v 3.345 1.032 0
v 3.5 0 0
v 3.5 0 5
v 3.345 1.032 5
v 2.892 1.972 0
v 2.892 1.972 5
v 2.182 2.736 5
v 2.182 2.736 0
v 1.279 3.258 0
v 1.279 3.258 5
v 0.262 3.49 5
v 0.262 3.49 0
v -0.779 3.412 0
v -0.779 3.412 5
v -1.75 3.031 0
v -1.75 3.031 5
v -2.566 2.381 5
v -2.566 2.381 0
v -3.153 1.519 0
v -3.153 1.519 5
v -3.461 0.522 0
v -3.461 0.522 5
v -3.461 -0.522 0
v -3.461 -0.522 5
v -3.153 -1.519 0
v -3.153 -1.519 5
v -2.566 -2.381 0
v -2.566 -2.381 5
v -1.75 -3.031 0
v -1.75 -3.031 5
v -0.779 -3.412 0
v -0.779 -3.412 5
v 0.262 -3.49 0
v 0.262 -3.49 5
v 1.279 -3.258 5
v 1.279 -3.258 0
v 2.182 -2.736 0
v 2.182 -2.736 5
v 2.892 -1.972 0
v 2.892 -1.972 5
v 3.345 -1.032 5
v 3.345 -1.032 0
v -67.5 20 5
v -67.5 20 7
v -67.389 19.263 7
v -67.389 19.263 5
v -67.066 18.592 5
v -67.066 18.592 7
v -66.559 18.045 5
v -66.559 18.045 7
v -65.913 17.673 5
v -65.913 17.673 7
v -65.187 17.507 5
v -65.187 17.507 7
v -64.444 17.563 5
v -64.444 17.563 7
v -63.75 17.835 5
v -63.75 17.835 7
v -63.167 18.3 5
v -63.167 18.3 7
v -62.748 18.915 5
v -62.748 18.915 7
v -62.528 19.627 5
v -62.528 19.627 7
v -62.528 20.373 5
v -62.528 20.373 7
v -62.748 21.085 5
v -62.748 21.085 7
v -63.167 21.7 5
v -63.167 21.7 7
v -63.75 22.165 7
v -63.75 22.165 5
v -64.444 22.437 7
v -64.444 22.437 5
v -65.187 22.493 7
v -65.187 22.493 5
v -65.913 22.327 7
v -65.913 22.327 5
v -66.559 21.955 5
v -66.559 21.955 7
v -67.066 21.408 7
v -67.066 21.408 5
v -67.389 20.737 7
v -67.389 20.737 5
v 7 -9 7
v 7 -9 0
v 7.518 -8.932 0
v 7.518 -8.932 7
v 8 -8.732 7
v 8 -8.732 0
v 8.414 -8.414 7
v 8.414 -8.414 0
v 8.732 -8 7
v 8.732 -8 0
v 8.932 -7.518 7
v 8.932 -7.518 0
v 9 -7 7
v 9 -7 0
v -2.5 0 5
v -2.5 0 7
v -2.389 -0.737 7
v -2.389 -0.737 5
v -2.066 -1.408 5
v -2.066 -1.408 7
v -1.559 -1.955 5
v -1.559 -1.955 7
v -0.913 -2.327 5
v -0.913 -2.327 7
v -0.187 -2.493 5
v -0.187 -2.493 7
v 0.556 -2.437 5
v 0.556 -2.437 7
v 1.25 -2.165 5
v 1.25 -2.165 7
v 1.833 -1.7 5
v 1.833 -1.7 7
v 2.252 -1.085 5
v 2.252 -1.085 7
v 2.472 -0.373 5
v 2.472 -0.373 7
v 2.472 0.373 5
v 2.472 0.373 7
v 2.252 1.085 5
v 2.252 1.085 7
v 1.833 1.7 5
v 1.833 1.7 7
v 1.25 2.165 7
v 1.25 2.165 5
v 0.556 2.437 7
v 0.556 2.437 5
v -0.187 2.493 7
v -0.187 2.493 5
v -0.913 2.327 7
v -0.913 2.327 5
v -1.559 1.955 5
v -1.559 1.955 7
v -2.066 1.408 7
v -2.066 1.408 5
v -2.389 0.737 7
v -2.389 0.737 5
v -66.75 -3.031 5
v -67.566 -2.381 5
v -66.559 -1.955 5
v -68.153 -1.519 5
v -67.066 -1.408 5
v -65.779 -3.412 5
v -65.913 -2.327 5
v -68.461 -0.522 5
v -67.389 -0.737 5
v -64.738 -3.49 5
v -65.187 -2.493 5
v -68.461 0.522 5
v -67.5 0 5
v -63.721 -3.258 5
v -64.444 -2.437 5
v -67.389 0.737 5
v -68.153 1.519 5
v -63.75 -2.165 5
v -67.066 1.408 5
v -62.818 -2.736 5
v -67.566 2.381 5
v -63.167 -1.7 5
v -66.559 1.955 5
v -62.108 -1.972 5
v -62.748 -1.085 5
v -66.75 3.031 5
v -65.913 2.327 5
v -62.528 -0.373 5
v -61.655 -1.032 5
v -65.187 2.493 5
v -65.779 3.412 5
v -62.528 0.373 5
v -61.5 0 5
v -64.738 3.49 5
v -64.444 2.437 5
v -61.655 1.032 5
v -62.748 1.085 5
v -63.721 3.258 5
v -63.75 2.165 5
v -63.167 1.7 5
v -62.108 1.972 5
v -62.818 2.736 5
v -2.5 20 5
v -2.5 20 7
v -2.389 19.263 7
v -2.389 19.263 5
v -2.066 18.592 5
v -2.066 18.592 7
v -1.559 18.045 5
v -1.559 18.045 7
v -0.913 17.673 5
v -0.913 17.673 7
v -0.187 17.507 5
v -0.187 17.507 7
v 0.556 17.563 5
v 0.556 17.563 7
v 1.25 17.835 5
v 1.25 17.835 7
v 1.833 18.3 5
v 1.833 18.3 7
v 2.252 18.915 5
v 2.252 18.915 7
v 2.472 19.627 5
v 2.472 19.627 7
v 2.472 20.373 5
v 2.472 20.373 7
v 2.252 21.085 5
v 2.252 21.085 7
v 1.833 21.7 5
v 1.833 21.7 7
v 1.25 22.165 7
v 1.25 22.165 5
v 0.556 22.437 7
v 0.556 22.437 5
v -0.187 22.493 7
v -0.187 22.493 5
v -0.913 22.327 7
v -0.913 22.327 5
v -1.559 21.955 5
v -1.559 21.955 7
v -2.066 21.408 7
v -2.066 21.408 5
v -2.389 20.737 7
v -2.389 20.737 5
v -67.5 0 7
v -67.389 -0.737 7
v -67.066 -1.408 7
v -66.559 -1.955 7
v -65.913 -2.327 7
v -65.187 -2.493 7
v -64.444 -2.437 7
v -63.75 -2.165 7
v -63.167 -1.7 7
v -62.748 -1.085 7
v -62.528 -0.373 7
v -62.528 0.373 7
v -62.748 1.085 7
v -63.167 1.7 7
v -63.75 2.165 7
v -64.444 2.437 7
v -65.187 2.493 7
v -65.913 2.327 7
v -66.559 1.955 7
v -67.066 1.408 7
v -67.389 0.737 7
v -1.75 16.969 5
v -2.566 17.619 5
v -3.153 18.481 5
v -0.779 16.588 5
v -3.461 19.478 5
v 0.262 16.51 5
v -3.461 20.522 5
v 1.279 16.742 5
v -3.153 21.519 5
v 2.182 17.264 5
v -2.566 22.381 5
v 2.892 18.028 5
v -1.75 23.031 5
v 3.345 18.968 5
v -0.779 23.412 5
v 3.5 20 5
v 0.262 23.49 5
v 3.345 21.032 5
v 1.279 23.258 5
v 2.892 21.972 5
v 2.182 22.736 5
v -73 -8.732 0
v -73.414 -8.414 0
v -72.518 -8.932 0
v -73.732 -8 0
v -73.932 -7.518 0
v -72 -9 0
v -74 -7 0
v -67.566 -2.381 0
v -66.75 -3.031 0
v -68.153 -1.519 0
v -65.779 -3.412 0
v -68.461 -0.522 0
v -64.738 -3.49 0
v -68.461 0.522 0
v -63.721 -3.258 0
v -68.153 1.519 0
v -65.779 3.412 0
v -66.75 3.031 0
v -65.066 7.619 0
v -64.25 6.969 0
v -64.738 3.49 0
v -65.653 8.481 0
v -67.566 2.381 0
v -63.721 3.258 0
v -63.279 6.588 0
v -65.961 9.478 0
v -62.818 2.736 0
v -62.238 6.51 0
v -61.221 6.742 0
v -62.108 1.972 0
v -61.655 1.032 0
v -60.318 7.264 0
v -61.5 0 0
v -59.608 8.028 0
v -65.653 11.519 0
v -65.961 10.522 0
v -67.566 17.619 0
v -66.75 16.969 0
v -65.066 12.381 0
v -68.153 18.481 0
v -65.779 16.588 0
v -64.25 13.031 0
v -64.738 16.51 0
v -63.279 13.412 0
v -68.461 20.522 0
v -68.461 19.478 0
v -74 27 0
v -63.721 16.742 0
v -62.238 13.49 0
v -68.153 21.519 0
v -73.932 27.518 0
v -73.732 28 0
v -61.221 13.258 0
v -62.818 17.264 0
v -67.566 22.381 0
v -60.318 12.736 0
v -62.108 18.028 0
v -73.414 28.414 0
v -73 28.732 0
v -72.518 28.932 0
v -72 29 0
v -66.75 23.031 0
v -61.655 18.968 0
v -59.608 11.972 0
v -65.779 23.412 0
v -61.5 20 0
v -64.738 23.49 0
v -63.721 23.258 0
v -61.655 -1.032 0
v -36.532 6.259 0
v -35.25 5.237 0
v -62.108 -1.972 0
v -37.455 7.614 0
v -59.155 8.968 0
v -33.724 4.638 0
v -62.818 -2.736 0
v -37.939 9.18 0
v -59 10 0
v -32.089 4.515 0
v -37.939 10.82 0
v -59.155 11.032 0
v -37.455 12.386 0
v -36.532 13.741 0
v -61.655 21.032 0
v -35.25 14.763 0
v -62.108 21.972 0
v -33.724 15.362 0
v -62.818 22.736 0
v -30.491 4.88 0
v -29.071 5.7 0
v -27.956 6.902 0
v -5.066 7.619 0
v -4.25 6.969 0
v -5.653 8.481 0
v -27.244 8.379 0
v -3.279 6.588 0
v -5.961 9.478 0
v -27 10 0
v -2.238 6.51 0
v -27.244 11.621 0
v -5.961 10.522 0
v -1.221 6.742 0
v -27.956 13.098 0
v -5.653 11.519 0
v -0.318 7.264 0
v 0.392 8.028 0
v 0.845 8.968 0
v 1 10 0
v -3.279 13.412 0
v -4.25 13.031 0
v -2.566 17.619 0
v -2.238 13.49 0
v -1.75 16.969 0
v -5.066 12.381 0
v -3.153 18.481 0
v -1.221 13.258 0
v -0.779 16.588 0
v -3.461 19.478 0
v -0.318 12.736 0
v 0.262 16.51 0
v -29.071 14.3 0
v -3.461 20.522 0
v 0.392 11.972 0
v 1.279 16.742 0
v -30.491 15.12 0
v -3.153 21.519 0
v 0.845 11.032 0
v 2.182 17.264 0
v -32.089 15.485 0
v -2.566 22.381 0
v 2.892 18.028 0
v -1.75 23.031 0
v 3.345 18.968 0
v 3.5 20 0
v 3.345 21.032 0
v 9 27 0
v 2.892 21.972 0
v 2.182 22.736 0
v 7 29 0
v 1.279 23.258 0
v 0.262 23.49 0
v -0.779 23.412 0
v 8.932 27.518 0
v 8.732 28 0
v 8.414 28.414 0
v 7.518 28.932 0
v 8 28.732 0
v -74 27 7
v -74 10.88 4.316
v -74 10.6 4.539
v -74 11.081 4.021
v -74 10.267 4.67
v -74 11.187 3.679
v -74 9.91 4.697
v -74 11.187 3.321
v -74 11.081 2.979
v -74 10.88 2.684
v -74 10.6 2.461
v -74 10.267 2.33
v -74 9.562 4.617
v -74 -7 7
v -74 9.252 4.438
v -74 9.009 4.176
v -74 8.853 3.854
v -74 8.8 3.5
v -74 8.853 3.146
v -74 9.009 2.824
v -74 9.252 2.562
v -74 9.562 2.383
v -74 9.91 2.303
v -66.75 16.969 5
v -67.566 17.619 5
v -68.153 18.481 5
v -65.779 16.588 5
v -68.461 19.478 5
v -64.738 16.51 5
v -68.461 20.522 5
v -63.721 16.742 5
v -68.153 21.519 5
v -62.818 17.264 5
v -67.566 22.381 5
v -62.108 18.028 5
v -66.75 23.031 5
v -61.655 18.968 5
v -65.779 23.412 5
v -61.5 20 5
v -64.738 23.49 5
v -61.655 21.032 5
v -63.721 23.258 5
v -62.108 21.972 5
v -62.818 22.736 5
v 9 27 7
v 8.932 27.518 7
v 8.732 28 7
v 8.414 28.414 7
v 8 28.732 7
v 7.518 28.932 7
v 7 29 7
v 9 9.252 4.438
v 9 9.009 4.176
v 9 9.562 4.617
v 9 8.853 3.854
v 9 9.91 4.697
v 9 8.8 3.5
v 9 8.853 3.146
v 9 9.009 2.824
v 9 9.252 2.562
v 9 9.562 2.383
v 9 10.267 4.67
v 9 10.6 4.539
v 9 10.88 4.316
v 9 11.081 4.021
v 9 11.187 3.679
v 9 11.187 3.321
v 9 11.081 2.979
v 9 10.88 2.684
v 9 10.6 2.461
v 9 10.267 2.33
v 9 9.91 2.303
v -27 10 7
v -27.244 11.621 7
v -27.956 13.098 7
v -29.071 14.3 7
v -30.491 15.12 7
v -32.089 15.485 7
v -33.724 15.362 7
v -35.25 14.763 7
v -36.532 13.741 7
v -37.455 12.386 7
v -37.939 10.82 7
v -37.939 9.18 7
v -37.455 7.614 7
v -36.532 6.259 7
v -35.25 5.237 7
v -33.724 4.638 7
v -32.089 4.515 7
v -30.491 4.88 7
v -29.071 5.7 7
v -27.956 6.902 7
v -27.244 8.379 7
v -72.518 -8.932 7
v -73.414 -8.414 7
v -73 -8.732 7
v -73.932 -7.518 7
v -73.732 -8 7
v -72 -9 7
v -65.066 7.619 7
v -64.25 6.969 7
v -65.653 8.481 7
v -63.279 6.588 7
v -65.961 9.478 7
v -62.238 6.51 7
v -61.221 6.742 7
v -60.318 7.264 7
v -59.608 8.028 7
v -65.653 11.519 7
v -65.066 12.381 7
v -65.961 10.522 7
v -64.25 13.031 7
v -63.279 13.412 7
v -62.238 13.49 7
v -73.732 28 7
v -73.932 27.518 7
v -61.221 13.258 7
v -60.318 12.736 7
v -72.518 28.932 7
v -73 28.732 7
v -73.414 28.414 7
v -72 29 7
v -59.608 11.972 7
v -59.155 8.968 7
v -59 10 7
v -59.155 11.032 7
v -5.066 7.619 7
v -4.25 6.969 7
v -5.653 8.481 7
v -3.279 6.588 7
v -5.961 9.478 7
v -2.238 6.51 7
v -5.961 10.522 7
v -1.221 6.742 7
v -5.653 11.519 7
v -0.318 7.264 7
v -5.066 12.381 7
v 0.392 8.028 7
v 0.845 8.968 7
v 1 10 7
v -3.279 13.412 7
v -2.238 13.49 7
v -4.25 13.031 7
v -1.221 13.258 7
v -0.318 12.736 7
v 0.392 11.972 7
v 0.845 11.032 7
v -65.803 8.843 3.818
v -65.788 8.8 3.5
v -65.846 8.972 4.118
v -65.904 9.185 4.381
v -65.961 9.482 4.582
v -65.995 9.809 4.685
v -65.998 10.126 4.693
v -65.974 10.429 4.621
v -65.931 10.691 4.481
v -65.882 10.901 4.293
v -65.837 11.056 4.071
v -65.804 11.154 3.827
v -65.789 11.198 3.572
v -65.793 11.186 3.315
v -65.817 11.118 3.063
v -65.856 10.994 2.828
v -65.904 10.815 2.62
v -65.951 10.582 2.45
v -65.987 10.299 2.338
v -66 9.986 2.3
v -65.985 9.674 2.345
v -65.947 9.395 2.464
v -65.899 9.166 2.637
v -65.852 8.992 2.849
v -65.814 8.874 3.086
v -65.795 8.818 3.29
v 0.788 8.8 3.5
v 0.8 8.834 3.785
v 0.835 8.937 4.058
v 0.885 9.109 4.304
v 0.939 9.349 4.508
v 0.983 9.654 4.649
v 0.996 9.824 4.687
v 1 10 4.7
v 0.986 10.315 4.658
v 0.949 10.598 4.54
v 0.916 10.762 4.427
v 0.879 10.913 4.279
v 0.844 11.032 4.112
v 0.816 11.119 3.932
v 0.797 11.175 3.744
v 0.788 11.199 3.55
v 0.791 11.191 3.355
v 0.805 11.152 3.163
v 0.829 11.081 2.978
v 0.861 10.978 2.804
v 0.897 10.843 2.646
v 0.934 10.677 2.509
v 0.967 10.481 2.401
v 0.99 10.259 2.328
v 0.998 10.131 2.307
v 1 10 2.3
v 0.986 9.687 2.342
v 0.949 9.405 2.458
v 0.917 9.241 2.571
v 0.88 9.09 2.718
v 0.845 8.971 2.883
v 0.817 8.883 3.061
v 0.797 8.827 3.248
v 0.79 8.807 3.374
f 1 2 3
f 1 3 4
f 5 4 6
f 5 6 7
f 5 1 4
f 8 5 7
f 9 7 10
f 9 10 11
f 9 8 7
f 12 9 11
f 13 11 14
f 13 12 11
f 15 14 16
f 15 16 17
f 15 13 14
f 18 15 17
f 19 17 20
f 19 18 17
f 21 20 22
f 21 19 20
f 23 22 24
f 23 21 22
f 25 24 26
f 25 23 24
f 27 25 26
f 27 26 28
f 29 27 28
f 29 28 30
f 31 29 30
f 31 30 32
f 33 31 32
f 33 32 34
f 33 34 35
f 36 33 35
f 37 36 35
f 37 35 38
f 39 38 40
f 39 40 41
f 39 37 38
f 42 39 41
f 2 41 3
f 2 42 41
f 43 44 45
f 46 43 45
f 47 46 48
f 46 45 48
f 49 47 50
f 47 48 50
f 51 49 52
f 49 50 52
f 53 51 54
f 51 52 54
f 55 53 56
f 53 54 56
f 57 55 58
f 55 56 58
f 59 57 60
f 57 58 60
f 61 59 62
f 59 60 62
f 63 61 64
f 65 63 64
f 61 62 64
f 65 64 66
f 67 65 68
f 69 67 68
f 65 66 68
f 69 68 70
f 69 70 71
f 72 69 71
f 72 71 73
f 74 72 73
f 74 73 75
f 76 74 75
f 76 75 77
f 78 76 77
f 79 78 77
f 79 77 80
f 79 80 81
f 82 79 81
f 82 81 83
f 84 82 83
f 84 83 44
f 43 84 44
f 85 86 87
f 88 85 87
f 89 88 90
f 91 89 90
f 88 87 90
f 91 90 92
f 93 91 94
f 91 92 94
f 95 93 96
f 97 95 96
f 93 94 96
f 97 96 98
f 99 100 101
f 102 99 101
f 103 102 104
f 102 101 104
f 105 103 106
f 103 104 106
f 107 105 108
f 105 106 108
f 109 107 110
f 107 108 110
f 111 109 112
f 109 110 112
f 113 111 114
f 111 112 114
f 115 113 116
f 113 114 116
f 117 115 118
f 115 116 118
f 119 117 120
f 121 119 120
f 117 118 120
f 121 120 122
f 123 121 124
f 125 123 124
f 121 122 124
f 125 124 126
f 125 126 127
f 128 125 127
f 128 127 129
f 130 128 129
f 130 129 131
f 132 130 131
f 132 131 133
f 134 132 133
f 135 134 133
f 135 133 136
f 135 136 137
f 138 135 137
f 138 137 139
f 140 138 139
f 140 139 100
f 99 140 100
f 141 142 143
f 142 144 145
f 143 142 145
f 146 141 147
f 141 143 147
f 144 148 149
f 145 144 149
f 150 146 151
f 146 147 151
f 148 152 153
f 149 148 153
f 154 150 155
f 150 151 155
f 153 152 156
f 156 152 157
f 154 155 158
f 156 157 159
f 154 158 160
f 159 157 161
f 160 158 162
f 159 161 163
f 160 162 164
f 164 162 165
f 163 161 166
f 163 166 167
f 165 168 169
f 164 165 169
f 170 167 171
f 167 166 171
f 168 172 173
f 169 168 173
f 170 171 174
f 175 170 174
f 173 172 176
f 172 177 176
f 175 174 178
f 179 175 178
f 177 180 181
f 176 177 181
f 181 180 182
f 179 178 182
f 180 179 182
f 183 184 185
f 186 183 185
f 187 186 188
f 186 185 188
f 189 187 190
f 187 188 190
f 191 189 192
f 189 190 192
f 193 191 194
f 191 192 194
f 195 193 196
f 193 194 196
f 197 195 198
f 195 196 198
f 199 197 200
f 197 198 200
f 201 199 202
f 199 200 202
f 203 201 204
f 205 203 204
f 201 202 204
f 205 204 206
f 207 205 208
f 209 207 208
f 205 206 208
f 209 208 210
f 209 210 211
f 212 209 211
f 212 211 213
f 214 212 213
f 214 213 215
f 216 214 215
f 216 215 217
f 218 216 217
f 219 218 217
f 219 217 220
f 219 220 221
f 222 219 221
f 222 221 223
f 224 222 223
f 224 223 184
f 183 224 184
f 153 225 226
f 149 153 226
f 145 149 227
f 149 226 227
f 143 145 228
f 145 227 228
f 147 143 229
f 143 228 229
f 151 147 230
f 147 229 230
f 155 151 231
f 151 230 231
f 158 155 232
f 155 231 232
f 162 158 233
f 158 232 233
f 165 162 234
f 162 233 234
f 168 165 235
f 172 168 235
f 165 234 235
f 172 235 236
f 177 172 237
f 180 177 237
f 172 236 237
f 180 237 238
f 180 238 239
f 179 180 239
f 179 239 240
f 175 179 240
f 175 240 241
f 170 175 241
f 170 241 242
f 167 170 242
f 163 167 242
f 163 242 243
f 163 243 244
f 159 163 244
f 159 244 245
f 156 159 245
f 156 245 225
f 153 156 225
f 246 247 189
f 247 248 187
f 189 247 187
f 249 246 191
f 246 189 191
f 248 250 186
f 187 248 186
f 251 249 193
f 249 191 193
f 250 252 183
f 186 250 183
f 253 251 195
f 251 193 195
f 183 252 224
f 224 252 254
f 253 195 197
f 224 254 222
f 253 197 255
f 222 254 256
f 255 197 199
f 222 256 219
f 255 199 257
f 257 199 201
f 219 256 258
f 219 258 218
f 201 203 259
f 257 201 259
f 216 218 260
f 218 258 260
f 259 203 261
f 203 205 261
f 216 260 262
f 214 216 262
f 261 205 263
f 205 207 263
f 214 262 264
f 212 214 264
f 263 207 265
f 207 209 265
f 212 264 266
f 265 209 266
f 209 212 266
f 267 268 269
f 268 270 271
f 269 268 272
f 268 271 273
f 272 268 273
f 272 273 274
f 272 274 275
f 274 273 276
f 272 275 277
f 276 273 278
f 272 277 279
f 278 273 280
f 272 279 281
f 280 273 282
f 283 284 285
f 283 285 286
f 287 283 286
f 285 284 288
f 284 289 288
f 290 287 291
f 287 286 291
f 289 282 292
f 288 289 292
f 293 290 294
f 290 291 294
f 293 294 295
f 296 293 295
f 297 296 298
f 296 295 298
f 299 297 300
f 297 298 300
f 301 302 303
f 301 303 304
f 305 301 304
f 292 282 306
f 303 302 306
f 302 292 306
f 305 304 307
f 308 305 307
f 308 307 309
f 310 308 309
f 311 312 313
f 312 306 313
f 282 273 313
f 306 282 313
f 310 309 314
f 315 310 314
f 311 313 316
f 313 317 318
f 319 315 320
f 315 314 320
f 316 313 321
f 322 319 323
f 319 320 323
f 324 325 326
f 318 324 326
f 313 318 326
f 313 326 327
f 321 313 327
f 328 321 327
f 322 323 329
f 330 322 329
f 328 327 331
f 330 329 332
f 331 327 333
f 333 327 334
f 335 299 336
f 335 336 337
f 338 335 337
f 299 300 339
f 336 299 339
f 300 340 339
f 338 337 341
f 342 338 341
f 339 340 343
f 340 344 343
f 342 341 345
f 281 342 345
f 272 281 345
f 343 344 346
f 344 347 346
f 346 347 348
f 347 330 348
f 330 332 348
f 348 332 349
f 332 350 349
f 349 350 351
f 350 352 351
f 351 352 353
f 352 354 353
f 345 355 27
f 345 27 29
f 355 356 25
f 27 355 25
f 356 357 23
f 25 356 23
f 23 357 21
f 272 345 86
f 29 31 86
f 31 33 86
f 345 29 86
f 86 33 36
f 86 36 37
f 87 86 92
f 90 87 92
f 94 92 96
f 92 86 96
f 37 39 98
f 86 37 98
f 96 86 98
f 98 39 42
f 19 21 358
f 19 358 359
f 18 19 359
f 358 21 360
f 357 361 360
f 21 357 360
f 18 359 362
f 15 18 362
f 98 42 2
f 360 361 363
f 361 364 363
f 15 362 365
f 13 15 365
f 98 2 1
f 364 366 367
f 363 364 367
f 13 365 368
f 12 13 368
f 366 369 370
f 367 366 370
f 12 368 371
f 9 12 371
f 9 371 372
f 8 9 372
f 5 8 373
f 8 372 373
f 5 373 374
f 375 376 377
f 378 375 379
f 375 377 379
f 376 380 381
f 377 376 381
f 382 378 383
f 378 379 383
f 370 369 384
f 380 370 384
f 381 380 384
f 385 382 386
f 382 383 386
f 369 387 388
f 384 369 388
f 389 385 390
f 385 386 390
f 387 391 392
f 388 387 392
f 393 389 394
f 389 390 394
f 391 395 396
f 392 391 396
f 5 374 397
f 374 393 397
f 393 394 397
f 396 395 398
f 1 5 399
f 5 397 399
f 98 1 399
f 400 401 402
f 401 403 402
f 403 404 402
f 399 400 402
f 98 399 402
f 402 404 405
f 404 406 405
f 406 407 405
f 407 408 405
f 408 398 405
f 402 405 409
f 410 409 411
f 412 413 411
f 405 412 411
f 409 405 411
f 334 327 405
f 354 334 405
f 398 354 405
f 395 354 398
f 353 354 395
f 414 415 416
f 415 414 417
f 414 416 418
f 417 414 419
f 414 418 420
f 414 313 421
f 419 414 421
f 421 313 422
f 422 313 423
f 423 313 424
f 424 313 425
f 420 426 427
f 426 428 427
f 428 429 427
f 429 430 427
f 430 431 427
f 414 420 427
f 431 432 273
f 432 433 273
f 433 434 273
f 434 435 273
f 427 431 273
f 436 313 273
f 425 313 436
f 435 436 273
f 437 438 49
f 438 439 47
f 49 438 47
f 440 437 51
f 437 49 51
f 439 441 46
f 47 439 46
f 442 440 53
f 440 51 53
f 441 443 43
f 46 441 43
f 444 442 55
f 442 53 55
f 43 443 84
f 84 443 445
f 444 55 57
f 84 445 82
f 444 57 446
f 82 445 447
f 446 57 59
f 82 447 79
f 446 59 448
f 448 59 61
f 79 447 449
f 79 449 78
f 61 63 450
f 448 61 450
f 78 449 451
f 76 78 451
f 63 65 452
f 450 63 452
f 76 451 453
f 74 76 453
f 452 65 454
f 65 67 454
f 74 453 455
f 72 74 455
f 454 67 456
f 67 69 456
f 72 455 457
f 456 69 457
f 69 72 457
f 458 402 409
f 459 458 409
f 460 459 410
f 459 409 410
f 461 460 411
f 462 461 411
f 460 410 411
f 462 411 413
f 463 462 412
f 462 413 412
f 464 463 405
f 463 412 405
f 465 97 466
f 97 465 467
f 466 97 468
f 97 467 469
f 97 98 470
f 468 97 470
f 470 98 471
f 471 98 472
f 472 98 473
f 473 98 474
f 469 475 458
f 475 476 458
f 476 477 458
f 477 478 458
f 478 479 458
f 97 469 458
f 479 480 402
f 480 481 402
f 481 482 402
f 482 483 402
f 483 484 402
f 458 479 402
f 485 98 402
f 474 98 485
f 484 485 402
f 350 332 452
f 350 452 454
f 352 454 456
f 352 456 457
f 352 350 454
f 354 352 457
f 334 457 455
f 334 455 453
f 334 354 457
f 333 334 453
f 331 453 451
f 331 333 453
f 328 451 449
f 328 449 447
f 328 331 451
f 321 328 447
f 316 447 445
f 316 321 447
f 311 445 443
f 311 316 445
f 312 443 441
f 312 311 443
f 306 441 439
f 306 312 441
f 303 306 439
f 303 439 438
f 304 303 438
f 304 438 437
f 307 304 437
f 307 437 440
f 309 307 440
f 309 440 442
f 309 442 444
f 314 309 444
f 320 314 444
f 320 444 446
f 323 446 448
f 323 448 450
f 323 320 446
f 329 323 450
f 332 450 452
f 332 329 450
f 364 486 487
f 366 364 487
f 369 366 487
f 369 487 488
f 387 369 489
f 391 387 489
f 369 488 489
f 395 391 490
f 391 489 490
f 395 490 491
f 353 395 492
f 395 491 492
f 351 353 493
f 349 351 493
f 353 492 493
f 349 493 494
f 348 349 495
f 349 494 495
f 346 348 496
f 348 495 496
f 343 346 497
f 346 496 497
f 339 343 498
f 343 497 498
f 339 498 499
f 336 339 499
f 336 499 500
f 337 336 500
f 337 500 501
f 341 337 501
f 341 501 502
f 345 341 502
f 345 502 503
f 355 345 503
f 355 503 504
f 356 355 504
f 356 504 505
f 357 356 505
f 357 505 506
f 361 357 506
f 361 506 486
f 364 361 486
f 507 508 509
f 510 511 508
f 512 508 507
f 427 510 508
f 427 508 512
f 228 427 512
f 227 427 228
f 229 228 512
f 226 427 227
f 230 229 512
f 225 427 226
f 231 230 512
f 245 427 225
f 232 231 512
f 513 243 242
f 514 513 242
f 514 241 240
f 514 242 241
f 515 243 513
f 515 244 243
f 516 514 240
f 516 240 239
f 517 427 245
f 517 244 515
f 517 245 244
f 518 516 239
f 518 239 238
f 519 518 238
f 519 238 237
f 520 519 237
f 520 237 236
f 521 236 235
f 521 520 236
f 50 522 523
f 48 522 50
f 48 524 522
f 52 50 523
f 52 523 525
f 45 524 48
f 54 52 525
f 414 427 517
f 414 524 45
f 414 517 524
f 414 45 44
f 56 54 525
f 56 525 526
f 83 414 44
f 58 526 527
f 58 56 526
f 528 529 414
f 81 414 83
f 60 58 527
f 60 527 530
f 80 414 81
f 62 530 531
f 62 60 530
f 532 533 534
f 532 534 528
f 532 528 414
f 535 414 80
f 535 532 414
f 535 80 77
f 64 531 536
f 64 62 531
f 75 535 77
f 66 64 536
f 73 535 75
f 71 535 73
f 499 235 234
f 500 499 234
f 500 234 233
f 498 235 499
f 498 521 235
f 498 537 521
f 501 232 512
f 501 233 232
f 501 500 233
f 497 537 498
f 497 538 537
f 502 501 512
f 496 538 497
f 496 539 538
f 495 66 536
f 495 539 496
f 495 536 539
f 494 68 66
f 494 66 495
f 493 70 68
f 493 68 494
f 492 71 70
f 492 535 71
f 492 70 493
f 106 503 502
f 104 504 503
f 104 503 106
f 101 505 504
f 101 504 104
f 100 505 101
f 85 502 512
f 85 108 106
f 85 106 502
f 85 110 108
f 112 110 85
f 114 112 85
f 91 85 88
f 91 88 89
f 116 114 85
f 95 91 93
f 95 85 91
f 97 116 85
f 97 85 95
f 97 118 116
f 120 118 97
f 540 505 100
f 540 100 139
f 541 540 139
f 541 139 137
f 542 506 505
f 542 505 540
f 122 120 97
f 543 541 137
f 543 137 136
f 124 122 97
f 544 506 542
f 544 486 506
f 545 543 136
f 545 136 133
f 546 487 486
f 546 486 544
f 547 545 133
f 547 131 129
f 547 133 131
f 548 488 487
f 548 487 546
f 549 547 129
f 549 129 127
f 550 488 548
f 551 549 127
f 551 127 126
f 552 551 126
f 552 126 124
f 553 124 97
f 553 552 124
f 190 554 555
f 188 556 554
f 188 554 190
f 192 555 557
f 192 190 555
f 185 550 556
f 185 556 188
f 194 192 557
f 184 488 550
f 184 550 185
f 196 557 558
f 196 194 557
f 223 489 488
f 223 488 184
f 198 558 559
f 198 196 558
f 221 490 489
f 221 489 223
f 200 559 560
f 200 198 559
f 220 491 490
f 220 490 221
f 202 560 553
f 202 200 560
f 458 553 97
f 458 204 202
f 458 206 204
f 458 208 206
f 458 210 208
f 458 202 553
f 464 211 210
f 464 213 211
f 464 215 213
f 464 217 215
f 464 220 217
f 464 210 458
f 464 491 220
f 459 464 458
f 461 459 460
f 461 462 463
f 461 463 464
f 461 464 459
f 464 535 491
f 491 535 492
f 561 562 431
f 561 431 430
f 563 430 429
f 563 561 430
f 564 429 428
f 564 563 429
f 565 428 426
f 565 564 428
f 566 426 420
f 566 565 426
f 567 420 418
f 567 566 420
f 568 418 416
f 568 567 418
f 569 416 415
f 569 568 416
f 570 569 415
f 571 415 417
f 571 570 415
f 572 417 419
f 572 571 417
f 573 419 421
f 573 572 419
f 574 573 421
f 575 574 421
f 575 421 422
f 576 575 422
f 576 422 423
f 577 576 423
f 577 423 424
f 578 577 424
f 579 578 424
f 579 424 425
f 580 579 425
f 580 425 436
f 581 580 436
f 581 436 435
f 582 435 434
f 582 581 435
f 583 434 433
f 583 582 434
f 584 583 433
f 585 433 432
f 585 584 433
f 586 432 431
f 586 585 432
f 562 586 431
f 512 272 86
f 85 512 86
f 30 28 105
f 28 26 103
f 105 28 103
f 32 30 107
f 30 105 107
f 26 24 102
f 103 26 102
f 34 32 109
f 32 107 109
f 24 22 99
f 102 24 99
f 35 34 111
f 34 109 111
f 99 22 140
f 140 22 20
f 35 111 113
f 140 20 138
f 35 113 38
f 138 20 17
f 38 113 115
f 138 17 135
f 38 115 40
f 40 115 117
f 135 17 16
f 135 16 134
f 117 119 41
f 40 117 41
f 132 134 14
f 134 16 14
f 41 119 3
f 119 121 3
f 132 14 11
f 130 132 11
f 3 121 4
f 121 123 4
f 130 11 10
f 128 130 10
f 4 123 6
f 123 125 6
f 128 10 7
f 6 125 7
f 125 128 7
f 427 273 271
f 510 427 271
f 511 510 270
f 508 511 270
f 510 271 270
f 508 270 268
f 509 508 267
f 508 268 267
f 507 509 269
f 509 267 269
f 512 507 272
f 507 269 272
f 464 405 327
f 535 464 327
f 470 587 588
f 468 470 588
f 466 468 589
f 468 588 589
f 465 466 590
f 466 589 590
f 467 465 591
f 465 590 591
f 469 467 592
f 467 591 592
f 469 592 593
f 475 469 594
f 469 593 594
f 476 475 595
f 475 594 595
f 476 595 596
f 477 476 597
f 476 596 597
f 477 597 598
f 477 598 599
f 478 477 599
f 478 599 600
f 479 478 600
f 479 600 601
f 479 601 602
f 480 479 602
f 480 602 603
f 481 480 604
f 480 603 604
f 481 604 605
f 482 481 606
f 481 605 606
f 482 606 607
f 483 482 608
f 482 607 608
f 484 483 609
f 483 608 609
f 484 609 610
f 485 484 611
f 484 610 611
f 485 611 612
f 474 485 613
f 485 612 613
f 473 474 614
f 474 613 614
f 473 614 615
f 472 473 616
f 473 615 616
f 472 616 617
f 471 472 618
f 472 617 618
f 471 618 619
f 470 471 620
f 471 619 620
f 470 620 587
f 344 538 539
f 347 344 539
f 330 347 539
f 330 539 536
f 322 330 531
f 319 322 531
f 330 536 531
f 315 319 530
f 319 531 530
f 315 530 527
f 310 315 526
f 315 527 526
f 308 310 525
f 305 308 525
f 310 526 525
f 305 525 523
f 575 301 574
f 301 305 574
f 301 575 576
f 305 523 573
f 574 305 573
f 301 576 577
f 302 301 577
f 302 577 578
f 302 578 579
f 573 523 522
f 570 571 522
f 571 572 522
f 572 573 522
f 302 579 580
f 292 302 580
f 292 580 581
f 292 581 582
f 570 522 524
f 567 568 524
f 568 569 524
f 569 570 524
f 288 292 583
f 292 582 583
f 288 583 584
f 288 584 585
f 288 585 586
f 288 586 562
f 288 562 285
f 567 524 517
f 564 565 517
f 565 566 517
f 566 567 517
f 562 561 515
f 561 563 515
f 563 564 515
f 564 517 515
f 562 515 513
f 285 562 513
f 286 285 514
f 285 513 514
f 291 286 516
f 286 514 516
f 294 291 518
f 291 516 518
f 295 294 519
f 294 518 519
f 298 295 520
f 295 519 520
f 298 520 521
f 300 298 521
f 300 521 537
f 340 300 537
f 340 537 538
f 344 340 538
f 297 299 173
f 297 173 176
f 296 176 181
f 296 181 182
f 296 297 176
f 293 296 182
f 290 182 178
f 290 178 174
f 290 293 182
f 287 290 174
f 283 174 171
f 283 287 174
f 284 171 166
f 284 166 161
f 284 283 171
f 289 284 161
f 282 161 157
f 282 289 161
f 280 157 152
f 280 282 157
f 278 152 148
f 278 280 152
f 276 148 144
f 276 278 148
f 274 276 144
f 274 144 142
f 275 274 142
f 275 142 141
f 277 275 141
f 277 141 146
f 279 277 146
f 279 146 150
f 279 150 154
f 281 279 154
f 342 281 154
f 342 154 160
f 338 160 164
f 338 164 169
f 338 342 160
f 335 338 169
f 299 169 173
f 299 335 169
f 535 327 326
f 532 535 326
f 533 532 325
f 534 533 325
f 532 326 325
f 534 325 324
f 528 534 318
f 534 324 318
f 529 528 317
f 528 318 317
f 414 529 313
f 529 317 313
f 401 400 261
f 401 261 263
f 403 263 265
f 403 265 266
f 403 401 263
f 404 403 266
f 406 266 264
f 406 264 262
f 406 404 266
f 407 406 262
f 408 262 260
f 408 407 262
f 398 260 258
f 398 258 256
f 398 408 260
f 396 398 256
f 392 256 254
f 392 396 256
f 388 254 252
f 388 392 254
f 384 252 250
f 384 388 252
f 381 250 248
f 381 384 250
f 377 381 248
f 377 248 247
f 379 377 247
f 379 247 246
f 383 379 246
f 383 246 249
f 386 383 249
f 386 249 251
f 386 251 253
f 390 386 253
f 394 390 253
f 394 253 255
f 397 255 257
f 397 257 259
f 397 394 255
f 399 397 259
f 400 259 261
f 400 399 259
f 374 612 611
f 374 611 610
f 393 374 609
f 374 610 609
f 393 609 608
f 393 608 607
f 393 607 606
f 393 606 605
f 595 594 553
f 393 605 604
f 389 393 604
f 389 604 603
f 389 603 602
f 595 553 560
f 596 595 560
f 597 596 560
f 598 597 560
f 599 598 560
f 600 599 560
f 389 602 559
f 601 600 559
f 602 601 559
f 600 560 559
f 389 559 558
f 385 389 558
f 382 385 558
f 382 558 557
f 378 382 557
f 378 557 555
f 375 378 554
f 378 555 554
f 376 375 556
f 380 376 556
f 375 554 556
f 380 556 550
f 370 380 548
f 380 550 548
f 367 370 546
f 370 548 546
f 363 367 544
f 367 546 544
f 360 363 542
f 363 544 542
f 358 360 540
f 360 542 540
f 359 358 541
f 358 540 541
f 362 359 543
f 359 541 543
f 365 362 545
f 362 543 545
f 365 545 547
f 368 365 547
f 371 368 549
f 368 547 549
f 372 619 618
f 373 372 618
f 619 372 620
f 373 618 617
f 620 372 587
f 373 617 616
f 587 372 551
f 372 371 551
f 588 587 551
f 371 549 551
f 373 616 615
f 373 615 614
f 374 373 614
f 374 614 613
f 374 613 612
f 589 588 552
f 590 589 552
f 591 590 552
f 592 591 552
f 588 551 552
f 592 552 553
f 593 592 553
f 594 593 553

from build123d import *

# Parameters (mm, degrees)
F0_W      = 65
F0_H      = 20
F1_DEPTH  = 7
F2_D      = 5
F3_R      = 3.5
F4_DEPTH  = 25
F6_D      = 2.4
F6_DEPTH  = 11.8
F6_TIP    = 0.7210327428
F8_R      = 5.5
F9_DEPTH  = 25
F10_R     = 3.5
F11_DEPTH = 5


# Not quite as in the source:
# - a pattern or mirror of a feature is missing from the dataset's text; its kind, count and spacing are read off the source's solid


with BuildPart() as f1:
    # F0 (on Top) → F1 (new body)
    with BuildSketch(Plane.XY):
        with BuildLine():
            ThreePointArc((9, 27), (8.4142135624, 28.4142135624), (7, 29))
            Line((7, 29), (-72, 29))
            ThreePointArc((-72, 29), (-73.4142135624, 28.4142135624), (-74, 27))
            Line((-74, 27), (-74, -7))
            ThreePointArc((-74, -7), (-73.4142135624, -8.4142135624), (-72, -9))
            Line((-72, -9), (7, -9))
            ThreePointArc((7, -9), (8.4142135624, -8.4142135624), (9, -7))
            Line((9, -7), (9, 27))
        make_face()
        with Locations((-32.5, 10)):
            Rectangle(F0_W, F0_H, mode=Mode.SUBTRACT)
        with Locations((-32.5, 10)):
            Rectangle(F0_W, F0_H)
    extrude(amount=F1_DEPTH)

    # F2 (through all)
    with Locations(Plane(origin=(0, 0, 0), x_dir=(1, 0, 0), z_dir=(0, 0, -1))):
        with Locations((-65, -20), (-65, 0), (0, 0), (0, -20)):
            Hole(F2_D / 2)

    # F3 (on face) → F4 (cut)
    with BuildSketch(Plane.XY.offset(7)):
        with Locations((-62.5, 10)):
            Circle(F3_R)
        with Locations((-2.5, 10)):
            Circle(F3_R)
    extrude(amount=-F4_DEPTH, mode=Mode.SUBTRACT)

    # F6
    with Locations(Plane.YZ.offset(9)):
        with Locations((10, 3.5)):
            f6 = Hole(F6_D / 2, depth=F6_DEPTH)
            with Locations((0, 0, -(F6_DEPTH + F6_TIP / 2))):  # 118° drill point
                Cone(0, F6_D / 2, F6_TIP, mode=Mode.SUBTRACT)

    # F6_copies: F6 across plane
    add(f6.mirror(Plane(origin=(-32.500003, -1e-06, 0), x_dir=(0, 0, -1), z_dir=(-1, 0, 0))), mode=Mode.SUBTRACT)

    # F8 (on face) → F9 (cut)
    with BuildSketch(Plane.XY.offset(7)):
        with Locations((-32.5, 10)):
            Circle(F8_R)
    extrude(amount=-F9_DEPTH, mode=Mode.SUBTRACT)

    # F10 (on face) → F11 (cut)
    with BuildSketch(Plane.XY):
        Circle(F10_R)
        with Locations((-65, 0)):
            Circle(F10_R)
        with Locations((0, 20)):
            Circle(F10_R)
        with Locations((-65, 20)):
            Circle(F10_R)
    extrude(amount=F11_DEPTH, mode=Mode.SUBTRACT)


solid = f1.part
